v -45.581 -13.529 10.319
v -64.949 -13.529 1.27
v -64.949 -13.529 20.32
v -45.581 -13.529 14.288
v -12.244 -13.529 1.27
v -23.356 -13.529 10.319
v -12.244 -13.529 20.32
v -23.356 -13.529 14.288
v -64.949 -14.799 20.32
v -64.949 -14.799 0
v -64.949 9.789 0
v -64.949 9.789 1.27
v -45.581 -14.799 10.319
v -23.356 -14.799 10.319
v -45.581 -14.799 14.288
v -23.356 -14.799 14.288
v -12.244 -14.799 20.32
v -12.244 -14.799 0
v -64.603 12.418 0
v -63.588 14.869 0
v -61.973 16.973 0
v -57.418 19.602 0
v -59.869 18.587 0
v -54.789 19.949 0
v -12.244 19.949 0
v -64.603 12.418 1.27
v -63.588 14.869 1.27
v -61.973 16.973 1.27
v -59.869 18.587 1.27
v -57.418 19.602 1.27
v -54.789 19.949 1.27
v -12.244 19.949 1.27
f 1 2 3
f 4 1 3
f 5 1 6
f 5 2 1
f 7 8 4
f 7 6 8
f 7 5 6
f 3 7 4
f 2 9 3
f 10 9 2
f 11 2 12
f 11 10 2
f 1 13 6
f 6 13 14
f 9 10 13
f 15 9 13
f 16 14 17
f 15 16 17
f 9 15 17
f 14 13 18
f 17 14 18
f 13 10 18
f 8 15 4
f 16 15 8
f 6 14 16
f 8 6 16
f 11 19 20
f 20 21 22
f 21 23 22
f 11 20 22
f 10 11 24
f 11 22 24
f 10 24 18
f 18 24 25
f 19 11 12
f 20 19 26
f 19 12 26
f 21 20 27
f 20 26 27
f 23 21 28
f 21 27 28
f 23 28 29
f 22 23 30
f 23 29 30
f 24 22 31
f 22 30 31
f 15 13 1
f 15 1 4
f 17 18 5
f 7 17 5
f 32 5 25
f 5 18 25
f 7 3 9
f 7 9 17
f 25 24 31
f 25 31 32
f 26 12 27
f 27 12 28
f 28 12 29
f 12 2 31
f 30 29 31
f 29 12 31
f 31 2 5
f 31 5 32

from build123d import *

# Parameters (mm, degrees)
F0_W      = 52.705
F0_H      = 34.7472
F0_W_2    = 50.165
F0_H_2    = 32.2072
F1_DEPTH  = 20.32
F2_DEPTH  = 1.27
F3_R      = 10.16
F6_W      = 22.0472
F6_H      = 1.27
F7_DEPTH  = 0.381
F8_W      = 33.4772
F8_H      = 19.05
F9_DEPTH  = 78.74
F10_W     = 22.225
F10_H     = 3.96875
F11_DEPTH = 25.4


with BuildPart() as f1:
    # F0 (on Top) → F1 (new body)
    with BuildSketch(Plane.XY):
        with Locations((-38.596277, 2.575059)):
            Rectangle(F0_W, F0_H)
        with Locations((-38.596277, 2.575059)):
            Rectangle(F0_W_2, F0_H_2, mode=Mode.SUBTRACT)
    extrude(amount=F1_DEPTH)

    # F0 (on Top) → F2 (join)
    with BuildSketch(Plane.XY):
        with Locations((-38.596277, 2.575059)):
            Rectangle(F0_W_2, F0_H_2)
    extrude(amount=F2_DEPTH)

    # F3
    f3_edges = [f1.edges().sort_by_distance(p)[0] for p in [
        (-64.948777, 19.948659, 10.16),
        (-63.678777, 18.678659, 10.795),
    ]]
    fillet(f3_edges, radius=F3_R)

    # F6 (on face) → F7 (join)
    with BuildSketch(Plane(origin=(-13.513777, 0, 0), x_dir=(0, -1, 0), z_dir=(-1, 0, 0))):
        with Locations((2.504941, 8.5725)):
            Rectangle(F6_W, F6_H)
    extrude(amount=F7_DEPTH)

    # F8 (on face) → F9 (cut)
    with BuildSketch(Plane.YZ.offset(-12.243777)):
        with Locations((3.210059, 10.795)):
            Rectangle(F8_W, F8_H)
    extrude(amount=-F9_DEPTH, mode=Mode.SUBTRACT)

    # F10 (on face) → F11 (cut)
    with BuildSketch(Plane.XZ.offset(14.798541)):
        with Locations((-34.468777, 12.303125)):
            Rectangle(F10_W, F10_H)
    extrude(amount=-F11_DEPTH, mode=Mode.SUBTRACT)


solid = f1.part
